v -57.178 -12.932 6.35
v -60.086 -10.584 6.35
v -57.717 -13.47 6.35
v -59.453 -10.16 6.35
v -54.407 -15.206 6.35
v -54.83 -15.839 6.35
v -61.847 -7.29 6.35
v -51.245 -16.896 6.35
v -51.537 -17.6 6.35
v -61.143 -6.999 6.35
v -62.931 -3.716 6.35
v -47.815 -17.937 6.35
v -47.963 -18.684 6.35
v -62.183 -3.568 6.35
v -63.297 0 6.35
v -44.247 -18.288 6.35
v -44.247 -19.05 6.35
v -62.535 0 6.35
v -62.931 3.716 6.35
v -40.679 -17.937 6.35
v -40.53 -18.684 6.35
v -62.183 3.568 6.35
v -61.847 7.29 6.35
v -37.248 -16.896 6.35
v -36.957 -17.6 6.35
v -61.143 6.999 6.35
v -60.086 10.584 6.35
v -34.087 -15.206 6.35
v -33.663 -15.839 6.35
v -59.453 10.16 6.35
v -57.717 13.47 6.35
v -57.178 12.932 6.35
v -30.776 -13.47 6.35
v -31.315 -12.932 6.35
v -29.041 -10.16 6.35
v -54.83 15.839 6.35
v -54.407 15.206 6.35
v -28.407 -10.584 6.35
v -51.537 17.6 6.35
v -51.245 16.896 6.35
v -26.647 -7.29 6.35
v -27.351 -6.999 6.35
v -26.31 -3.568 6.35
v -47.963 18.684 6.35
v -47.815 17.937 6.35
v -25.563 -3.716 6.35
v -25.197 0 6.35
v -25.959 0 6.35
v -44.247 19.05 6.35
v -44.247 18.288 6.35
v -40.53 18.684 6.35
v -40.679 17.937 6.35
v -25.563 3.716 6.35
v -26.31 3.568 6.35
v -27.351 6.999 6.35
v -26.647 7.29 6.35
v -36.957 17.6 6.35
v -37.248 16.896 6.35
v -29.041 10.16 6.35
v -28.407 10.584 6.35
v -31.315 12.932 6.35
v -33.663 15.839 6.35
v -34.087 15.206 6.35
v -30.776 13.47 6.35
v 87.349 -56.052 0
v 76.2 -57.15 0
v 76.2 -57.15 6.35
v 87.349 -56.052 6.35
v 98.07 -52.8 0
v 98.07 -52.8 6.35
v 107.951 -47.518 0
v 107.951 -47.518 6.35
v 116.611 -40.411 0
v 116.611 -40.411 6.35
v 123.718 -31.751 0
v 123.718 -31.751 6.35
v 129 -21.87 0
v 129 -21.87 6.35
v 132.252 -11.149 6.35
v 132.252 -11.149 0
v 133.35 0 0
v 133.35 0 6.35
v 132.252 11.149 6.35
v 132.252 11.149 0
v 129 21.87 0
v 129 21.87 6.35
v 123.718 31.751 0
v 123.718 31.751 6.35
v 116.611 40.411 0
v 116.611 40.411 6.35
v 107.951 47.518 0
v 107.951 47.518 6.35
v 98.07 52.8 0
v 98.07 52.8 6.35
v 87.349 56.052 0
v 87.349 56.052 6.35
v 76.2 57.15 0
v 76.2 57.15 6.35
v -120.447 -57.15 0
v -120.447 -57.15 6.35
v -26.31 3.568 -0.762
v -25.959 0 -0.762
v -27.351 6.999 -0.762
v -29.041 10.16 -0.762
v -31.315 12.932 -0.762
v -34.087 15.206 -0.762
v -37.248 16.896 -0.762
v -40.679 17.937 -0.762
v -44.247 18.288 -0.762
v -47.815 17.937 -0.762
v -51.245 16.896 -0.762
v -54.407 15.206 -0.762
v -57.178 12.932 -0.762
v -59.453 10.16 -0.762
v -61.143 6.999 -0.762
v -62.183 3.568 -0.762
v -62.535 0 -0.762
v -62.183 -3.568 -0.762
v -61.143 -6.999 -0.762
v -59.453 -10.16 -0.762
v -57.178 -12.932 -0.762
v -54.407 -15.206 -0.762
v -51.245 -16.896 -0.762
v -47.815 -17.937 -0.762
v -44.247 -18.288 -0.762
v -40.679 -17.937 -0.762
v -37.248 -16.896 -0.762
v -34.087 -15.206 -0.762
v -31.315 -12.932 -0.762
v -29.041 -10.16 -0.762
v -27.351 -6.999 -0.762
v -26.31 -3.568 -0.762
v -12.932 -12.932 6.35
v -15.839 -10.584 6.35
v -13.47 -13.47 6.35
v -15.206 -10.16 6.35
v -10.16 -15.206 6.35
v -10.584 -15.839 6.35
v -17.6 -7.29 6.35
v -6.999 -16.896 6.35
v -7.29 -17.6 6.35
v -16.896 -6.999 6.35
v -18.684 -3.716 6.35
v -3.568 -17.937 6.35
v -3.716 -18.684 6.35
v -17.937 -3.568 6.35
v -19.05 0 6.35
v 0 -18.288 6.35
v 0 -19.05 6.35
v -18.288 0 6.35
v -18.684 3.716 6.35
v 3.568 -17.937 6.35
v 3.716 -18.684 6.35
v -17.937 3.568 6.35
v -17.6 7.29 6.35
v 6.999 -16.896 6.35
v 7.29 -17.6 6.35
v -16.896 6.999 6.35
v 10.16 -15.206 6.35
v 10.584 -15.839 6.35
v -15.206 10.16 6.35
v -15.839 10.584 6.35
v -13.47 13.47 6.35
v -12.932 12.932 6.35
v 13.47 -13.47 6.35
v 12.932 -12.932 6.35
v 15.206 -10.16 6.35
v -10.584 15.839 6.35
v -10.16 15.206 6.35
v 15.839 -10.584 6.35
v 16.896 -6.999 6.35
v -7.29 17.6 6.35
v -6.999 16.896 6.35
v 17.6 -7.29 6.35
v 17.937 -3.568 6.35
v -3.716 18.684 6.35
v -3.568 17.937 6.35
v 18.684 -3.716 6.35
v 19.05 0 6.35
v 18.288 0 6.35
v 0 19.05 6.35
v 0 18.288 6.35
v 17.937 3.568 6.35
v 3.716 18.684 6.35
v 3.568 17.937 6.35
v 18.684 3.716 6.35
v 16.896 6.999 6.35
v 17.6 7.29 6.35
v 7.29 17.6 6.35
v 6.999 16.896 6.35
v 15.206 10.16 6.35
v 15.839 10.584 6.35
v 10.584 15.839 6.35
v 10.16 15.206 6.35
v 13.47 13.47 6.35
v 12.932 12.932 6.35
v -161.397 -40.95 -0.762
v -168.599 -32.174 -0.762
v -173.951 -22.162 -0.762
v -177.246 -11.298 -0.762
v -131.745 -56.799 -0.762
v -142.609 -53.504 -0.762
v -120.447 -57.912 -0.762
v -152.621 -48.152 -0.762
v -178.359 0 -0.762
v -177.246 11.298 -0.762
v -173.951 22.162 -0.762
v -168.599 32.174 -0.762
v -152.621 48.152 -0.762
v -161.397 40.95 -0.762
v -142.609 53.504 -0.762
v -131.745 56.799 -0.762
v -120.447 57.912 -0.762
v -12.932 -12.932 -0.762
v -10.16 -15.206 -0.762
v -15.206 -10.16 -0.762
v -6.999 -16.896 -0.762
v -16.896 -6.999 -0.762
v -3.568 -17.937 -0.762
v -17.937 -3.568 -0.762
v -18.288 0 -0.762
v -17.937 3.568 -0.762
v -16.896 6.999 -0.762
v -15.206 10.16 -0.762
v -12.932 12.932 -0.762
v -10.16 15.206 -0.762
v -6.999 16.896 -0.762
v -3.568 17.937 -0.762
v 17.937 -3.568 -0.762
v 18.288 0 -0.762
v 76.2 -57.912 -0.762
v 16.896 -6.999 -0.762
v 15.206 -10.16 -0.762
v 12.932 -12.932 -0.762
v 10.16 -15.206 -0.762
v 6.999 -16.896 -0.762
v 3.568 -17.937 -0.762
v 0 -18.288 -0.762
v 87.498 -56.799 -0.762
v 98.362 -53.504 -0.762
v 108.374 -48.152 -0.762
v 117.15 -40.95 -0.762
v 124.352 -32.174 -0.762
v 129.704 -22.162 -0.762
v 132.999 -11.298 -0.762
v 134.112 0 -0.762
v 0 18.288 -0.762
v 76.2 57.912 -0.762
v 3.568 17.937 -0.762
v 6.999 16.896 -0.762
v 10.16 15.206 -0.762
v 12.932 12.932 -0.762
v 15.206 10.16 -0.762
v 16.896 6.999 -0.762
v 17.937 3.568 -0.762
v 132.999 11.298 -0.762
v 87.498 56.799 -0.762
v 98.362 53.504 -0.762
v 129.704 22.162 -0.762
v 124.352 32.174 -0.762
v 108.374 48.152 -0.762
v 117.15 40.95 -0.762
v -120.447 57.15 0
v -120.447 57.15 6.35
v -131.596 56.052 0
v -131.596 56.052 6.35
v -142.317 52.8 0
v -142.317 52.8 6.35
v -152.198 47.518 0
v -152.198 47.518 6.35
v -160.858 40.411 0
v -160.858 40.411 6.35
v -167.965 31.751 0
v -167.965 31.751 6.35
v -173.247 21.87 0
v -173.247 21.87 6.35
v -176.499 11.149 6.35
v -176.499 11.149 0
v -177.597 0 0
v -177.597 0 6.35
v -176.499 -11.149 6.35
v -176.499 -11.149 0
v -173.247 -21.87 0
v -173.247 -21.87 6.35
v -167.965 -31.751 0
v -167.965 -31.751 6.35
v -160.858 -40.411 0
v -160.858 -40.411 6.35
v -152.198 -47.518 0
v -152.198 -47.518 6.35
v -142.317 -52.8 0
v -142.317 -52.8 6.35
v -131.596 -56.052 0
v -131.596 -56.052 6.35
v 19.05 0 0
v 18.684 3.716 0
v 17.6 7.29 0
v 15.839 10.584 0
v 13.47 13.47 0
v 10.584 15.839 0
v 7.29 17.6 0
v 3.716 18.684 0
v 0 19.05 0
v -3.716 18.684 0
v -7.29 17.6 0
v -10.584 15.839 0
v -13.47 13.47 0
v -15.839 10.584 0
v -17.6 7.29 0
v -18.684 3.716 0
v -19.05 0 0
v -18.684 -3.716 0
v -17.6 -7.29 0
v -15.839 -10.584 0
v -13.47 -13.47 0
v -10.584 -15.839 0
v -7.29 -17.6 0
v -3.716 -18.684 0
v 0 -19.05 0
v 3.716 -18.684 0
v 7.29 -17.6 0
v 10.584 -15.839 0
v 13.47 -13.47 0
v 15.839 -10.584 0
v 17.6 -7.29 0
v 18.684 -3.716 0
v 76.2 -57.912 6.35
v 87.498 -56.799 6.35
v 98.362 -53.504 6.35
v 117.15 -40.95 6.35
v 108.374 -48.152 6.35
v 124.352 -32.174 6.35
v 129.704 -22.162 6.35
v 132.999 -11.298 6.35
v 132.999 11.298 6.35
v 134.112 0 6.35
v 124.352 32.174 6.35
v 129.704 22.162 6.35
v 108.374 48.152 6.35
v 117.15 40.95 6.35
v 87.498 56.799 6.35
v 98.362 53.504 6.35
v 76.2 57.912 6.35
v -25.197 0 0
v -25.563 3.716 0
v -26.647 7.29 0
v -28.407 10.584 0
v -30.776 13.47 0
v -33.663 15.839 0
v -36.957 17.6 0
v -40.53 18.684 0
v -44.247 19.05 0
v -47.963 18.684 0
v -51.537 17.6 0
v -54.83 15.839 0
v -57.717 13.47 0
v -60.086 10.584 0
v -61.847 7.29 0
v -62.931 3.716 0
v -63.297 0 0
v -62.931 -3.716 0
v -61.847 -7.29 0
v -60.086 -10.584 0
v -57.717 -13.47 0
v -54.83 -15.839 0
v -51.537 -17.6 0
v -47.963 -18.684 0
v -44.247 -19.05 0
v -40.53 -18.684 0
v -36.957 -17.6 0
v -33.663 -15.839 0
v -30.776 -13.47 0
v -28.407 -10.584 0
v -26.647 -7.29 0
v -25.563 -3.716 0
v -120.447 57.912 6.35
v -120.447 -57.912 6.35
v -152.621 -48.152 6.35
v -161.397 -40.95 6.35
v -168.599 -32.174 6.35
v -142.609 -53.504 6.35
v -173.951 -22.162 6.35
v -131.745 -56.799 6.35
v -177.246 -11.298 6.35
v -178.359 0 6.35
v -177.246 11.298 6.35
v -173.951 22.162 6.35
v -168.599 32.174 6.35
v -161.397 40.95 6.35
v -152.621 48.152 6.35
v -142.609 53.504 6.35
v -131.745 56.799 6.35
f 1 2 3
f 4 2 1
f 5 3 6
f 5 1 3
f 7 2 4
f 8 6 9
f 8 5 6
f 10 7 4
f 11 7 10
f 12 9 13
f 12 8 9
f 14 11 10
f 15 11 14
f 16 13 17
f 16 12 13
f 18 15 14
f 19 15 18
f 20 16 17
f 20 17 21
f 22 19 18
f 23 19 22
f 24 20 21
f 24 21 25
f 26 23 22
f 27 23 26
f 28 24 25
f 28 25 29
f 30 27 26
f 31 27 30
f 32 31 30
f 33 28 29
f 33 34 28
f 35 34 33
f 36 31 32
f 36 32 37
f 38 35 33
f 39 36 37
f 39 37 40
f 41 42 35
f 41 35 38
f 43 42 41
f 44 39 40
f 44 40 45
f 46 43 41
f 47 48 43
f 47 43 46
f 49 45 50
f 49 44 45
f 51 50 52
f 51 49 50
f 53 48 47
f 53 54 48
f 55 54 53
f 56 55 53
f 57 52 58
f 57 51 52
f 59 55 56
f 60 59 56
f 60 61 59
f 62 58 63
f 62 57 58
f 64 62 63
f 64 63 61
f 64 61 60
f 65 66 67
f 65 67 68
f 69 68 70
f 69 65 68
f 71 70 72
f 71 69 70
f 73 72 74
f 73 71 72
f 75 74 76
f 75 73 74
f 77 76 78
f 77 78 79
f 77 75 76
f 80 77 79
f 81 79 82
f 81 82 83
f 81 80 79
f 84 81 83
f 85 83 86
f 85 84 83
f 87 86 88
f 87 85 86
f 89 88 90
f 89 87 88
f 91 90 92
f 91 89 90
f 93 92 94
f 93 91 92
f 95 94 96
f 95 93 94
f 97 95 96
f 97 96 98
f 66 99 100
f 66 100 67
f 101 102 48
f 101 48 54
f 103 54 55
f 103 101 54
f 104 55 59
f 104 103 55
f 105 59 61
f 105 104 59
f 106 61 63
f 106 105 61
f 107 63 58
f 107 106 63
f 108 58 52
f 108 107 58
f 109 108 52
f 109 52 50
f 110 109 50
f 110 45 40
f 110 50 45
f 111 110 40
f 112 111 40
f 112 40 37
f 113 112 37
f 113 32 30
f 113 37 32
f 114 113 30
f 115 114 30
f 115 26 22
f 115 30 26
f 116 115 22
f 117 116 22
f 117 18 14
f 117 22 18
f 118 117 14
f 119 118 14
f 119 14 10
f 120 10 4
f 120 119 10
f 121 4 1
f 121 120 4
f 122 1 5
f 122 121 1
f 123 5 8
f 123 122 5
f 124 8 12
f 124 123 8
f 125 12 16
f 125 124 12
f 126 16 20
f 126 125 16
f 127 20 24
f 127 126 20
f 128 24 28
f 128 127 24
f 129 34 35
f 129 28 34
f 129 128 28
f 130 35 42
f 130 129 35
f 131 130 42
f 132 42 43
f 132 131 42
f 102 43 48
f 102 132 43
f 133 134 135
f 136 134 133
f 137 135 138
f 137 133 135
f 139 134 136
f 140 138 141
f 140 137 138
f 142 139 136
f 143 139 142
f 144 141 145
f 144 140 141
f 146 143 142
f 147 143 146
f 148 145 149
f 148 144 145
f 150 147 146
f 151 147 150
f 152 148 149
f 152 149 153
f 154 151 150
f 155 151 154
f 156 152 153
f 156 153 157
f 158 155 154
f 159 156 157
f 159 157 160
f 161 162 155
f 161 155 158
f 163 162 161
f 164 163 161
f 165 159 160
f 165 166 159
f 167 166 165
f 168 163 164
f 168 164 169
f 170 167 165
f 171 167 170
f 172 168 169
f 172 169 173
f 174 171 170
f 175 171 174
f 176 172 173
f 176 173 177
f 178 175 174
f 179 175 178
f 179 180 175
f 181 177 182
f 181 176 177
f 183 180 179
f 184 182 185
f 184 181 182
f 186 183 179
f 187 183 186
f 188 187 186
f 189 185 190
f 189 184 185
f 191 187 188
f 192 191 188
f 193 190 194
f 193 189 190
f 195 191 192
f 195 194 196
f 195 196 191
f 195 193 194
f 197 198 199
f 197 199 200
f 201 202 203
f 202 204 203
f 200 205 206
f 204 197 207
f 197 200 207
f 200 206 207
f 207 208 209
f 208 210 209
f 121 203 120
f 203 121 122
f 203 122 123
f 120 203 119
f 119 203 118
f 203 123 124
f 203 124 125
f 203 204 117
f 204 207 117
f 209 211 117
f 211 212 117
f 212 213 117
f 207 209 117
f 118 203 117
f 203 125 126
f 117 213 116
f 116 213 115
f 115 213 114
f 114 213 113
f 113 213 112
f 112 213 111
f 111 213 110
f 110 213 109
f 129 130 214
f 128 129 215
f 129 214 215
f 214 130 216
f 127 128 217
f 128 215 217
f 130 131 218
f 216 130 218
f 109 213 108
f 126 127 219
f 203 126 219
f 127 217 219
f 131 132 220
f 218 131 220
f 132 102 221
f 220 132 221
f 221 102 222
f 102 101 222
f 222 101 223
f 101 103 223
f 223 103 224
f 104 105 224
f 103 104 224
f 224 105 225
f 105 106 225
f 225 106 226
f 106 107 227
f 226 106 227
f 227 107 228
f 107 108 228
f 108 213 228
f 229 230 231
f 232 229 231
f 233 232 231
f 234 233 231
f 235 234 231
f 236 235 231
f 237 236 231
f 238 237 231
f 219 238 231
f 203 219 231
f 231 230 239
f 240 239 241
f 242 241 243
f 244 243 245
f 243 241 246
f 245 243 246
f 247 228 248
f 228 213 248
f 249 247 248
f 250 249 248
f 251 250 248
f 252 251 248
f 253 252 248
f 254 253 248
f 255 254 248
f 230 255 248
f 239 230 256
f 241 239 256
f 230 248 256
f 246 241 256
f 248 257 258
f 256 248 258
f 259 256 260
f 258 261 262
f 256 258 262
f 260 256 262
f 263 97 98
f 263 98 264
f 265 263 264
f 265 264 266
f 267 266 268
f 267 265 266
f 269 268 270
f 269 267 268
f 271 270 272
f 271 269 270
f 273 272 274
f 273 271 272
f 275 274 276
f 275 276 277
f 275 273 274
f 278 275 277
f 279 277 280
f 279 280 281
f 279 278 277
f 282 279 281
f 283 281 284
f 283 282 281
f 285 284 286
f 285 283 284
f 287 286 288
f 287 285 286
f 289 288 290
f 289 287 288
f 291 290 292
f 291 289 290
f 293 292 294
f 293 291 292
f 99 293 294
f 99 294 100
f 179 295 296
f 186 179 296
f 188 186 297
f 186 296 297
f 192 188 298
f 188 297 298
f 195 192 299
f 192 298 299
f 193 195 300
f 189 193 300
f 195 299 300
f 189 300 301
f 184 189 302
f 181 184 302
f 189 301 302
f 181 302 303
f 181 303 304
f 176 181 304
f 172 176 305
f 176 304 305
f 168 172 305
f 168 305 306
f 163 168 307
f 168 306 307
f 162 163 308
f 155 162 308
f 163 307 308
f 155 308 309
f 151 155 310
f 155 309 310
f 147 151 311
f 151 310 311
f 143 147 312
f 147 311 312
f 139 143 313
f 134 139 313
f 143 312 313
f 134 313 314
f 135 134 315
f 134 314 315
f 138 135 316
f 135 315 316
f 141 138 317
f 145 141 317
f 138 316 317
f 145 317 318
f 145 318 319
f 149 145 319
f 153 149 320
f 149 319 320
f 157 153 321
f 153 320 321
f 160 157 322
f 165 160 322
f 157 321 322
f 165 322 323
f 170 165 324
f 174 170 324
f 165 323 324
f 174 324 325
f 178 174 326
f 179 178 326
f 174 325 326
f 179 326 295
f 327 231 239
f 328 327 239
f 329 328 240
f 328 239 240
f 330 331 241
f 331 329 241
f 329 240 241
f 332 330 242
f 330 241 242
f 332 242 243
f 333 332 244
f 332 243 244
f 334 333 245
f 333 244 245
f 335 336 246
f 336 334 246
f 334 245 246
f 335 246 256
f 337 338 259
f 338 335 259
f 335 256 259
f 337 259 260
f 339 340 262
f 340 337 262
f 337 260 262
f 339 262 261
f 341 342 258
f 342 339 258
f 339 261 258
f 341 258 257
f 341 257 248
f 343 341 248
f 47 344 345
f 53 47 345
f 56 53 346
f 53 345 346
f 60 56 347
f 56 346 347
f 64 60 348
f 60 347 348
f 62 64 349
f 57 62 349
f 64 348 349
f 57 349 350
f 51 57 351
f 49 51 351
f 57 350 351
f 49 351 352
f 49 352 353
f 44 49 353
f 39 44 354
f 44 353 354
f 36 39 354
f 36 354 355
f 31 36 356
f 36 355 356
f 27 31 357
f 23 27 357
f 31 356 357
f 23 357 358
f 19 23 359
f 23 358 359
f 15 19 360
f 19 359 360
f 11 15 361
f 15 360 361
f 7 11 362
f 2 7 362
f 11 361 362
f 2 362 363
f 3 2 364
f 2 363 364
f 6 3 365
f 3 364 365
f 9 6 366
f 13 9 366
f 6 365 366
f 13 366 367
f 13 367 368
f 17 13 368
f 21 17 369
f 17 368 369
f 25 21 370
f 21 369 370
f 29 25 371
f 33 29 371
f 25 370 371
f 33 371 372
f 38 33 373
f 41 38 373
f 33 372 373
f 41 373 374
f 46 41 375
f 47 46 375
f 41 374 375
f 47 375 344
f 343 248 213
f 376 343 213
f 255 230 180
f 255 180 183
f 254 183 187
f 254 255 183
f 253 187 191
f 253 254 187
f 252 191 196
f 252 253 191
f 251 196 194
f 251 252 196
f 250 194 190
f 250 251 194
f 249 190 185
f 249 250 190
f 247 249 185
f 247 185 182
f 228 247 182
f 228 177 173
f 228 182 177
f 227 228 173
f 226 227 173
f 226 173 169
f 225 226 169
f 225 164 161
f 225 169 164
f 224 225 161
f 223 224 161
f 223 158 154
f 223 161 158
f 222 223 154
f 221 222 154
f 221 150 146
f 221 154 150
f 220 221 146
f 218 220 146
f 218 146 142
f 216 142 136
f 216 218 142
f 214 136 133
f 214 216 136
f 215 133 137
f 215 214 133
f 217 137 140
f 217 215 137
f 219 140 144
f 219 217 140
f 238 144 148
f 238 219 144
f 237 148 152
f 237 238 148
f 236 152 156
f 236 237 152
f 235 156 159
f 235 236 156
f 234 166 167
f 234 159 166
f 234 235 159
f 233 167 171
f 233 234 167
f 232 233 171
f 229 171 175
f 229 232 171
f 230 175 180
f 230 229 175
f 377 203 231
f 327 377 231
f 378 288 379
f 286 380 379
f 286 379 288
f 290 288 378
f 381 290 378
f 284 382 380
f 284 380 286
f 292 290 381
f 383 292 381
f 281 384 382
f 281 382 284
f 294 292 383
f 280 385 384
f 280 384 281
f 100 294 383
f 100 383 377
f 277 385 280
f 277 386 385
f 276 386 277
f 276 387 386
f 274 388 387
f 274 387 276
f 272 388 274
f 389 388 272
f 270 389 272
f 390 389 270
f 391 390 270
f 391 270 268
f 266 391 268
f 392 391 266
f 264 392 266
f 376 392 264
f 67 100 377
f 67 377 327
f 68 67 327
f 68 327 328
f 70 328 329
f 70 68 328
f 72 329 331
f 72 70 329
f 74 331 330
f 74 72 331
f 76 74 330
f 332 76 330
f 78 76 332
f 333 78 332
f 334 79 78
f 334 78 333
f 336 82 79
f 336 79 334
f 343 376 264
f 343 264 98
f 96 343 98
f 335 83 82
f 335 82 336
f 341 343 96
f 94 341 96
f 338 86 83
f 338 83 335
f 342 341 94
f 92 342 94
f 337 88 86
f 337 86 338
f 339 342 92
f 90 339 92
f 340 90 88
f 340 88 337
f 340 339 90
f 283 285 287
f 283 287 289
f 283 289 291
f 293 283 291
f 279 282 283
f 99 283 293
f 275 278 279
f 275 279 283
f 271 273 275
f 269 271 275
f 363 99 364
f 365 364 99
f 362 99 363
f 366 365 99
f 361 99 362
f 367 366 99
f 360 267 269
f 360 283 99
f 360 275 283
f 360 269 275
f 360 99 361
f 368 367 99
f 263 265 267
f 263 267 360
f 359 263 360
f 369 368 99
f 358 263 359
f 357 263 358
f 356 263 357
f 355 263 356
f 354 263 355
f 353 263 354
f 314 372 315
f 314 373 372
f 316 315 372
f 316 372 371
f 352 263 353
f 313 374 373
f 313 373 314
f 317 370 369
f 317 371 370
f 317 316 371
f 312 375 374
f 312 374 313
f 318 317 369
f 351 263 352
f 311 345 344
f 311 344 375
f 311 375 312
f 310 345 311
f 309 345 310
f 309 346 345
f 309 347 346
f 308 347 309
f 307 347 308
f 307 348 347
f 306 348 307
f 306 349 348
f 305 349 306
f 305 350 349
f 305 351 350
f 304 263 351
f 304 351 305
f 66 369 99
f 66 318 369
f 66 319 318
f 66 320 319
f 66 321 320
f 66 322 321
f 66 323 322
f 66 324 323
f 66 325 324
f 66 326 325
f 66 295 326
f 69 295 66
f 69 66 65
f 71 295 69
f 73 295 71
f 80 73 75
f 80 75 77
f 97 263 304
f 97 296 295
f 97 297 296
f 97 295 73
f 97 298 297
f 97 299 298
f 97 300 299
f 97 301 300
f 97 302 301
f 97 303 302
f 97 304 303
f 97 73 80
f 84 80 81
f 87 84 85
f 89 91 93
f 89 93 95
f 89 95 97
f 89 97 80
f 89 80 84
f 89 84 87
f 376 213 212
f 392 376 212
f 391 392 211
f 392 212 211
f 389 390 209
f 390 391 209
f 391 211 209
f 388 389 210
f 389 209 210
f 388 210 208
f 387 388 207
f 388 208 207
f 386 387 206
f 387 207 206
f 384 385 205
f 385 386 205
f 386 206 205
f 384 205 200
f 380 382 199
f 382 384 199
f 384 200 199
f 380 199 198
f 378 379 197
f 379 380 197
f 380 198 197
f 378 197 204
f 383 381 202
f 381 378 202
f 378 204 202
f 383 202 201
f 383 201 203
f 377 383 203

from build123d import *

# Parameters (mm, degrees)
F0_R     = 19.05
F1_DEPTH = 6.35
F2_T     = 0.762


with BuildPart() as f1:
    # F0 (on Top) → F1 (new body)
    with BuildSketch(Plane.XY):
        with BuildLine():
            Line((76.2, 57.15), (-120.4468, 57.15))
            ThreePointArc((-120.4468, 57.15), (-177.5968, 0), (-120.4468, -57.15))
            Line((-120.4468, -57.15), (76.2, -57.15))
            ThreePointArc((76.2, -57.15), (133.35, 0), (76.2, 57.15))
        make_face()
        with Locations((-44.2468, 0)):
            Circle(F0_R, mode=Mode.SUBTRACT)
        Circle(F0_R, mode=Mode.SUBTRACT)
    extrude(amount=F1_DEPTH)

    # F2
    f2_openings = [f1.faces().sort_by_distance(p)[0] for p in [
        (-22.1234, 0, 6.35),
    ]]
    offset(amount=F2_T, openings=f2_openings, kind=Kind.INTERSECTION)


solid = f1.part
